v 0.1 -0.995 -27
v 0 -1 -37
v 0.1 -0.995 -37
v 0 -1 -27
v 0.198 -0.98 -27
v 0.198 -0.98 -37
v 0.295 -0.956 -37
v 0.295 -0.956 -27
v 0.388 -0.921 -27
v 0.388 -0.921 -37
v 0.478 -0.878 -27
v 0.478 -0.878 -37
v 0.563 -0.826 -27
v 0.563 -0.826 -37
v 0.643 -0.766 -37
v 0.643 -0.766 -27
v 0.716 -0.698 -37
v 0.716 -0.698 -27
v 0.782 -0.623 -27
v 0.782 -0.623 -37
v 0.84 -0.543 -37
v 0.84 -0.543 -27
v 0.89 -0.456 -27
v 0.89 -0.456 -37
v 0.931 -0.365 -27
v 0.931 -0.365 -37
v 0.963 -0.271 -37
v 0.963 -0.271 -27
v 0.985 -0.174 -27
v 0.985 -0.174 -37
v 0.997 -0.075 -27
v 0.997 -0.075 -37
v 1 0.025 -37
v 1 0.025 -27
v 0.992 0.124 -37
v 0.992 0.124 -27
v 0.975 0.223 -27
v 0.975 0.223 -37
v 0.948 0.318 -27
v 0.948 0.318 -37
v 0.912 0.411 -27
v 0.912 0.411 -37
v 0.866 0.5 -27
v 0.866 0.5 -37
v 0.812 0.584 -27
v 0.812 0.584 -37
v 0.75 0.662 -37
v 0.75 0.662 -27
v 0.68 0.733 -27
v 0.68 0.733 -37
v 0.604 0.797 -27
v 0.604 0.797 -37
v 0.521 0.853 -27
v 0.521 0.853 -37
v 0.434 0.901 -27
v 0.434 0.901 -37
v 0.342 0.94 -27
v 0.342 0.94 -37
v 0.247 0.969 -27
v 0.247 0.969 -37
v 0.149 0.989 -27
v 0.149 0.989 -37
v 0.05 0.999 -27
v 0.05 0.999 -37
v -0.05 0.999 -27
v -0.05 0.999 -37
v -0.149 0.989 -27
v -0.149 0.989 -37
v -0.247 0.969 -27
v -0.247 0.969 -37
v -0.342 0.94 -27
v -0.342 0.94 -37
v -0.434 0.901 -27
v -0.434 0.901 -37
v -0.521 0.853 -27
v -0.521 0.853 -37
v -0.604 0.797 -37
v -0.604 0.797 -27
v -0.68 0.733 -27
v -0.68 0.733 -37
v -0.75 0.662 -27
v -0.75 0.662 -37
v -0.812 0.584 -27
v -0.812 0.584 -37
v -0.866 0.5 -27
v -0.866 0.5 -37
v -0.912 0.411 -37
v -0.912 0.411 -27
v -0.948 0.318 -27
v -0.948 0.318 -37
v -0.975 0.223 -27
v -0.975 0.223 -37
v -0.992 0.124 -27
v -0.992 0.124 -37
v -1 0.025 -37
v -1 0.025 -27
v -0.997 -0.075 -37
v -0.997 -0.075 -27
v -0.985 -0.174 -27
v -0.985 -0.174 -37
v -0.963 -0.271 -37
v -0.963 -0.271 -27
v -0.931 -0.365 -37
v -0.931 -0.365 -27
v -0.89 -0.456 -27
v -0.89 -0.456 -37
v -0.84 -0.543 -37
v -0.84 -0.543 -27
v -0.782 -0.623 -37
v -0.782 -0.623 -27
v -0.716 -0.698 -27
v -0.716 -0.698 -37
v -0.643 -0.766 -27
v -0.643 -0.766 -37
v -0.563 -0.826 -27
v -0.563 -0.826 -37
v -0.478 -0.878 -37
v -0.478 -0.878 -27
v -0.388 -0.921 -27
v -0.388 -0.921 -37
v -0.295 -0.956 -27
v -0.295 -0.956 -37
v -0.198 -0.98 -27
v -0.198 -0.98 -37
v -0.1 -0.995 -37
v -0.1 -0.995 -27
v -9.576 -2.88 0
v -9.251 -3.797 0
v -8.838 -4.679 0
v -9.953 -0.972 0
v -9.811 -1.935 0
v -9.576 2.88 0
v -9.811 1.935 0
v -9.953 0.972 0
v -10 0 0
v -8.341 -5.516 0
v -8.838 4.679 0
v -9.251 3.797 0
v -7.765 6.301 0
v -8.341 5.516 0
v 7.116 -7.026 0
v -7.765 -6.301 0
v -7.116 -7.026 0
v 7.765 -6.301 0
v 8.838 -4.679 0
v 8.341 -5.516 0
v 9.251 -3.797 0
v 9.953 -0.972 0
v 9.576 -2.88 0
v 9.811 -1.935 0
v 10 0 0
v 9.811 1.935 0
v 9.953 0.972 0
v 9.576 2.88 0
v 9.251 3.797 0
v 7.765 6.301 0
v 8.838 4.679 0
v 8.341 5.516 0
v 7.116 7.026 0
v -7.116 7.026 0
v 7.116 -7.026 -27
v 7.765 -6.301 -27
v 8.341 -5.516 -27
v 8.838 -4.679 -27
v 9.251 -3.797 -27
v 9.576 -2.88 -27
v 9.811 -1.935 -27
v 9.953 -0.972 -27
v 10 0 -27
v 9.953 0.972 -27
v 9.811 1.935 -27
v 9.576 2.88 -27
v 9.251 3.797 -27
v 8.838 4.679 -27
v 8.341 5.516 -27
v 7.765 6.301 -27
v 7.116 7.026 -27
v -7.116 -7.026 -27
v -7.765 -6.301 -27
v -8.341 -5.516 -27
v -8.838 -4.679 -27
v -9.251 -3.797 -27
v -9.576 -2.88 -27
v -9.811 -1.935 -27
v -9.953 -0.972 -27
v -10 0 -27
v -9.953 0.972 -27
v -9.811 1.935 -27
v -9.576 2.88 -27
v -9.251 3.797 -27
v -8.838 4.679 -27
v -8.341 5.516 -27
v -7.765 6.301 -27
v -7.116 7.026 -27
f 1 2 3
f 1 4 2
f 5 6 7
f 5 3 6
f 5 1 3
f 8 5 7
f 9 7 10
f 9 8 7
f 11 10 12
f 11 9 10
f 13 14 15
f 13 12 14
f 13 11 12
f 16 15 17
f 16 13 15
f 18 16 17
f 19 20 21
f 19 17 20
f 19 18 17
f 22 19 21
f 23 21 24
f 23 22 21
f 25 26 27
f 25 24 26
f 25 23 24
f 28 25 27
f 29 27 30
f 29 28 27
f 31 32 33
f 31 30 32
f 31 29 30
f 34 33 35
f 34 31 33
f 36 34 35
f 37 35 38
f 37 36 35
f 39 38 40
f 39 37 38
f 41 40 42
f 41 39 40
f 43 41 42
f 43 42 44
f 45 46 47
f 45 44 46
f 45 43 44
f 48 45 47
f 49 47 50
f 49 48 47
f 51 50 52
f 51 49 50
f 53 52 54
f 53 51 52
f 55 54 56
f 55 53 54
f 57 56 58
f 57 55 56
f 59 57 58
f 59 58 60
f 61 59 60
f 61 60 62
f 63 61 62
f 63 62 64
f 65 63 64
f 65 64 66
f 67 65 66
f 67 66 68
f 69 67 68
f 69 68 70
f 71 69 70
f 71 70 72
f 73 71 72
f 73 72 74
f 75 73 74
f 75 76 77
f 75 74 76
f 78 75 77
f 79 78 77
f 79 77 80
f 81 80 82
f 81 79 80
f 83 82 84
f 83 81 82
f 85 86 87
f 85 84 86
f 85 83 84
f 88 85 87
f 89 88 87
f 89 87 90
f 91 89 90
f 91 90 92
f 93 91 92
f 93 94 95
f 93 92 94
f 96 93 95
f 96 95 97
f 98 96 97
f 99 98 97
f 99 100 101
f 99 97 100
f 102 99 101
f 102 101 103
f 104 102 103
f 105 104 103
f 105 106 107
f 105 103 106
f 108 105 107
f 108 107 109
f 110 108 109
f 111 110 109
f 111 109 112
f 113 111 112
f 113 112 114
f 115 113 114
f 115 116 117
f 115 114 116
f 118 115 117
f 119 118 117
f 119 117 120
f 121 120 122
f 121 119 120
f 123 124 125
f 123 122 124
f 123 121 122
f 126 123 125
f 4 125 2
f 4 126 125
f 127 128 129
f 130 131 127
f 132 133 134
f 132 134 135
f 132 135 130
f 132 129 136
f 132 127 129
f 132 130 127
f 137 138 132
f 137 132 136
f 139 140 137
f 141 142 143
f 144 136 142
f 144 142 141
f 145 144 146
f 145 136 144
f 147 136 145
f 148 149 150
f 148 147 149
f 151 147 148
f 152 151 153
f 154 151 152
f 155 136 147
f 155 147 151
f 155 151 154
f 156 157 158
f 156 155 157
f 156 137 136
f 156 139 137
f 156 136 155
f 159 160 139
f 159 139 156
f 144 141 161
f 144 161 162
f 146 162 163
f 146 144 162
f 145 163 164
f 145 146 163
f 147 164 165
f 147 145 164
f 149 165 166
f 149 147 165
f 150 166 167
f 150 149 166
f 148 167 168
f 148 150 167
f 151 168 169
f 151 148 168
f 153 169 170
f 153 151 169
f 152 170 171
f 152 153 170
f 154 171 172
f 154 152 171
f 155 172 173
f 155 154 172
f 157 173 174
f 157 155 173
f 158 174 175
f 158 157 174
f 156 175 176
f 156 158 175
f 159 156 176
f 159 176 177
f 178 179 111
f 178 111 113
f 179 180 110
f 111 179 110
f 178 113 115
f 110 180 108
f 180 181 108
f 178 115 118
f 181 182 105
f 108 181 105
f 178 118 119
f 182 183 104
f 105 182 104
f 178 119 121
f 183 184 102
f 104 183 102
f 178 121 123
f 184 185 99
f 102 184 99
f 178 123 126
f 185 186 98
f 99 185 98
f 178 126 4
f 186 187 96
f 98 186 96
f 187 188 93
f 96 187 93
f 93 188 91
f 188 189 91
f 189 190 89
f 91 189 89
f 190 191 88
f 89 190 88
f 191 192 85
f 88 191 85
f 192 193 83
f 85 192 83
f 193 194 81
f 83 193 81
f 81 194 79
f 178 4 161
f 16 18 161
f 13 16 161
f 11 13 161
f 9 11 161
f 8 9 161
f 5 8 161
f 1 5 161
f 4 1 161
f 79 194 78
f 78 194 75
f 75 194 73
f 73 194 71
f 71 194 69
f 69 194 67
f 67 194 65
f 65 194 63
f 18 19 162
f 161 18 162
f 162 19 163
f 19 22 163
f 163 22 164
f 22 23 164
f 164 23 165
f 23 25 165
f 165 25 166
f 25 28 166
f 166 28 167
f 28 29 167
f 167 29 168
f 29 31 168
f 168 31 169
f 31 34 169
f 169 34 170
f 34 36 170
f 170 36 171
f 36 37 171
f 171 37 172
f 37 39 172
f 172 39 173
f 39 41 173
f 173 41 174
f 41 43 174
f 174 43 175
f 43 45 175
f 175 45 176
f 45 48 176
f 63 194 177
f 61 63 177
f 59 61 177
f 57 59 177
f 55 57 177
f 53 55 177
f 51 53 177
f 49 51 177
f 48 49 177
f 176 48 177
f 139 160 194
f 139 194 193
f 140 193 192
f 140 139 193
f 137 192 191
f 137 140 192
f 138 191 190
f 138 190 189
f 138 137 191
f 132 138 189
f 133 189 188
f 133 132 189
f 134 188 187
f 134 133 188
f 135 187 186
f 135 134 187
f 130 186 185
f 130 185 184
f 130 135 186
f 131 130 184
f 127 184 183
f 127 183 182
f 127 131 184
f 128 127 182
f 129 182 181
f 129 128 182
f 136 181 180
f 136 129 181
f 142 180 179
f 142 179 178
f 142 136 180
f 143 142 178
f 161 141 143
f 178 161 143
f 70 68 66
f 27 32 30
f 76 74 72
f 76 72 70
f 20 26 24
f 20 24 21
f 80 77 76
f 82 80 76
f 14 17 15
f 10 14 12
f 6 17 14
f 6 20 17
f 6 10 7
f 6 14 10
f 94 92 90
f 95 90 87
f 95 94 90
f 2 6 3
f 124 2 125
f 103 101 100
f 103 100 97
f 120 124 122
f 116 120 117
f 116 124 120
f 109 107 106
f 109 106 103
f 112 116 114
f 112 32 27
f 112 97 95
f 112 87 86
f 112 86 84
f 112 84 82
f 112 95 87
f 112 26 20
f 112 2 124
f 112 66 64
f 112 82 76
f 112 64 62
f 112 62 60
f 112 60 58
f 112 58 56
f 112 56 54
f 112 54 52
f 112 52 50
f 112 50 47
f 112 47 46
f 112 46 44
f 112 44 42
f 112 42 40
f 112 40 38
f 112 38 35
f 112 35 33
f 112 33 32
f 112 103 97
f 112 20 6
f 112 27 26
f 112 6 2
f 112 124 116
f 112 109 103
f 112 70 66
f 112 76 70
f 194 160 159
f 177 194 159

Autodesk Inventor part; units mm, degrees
ref_plane "YZ Plane" through (0, 0, 0) normal (1, 0, 0) x (0, 1, 0)
ref_plane "XZ Plane" through (0, 0, 0) normal (0, 1, 0) x (-1, 0, 0)
ref_plane "XY Plane" through (0, 0, 0) normal (0, 0, 1) x (1, 0, 0)
sketch "Sketch1" plane through (0, 0, 0) normal (0, 0, 1) x (1, 0, 0)
  circle A0 centre (0, 0) radius 10
  line L0 (0, 10) -> (0, 9)
  line L1 (-7.116, 7.0259) -> (7.116, 7.0259)
  line L2 (7.116, -7.0259) -> (-7.116, -7.0259)
  dimension "d0" = 20
  dimension "d7" = 14.0518
extrude "Extrusion1" add sketch "Sketch1" against normal blind 27 contours A0 L2 L1
sketch "Sketch2" plane through (0, 0, -27) normal (0, 0, -1) x (0, -1, 0)
  circle A0 centre (0, 0) radius 1
  dimension "d4" = 2
extrude "Extrusion2" add sketch "Sketch2" along normal blind 10
properties part number "motor 12v"
